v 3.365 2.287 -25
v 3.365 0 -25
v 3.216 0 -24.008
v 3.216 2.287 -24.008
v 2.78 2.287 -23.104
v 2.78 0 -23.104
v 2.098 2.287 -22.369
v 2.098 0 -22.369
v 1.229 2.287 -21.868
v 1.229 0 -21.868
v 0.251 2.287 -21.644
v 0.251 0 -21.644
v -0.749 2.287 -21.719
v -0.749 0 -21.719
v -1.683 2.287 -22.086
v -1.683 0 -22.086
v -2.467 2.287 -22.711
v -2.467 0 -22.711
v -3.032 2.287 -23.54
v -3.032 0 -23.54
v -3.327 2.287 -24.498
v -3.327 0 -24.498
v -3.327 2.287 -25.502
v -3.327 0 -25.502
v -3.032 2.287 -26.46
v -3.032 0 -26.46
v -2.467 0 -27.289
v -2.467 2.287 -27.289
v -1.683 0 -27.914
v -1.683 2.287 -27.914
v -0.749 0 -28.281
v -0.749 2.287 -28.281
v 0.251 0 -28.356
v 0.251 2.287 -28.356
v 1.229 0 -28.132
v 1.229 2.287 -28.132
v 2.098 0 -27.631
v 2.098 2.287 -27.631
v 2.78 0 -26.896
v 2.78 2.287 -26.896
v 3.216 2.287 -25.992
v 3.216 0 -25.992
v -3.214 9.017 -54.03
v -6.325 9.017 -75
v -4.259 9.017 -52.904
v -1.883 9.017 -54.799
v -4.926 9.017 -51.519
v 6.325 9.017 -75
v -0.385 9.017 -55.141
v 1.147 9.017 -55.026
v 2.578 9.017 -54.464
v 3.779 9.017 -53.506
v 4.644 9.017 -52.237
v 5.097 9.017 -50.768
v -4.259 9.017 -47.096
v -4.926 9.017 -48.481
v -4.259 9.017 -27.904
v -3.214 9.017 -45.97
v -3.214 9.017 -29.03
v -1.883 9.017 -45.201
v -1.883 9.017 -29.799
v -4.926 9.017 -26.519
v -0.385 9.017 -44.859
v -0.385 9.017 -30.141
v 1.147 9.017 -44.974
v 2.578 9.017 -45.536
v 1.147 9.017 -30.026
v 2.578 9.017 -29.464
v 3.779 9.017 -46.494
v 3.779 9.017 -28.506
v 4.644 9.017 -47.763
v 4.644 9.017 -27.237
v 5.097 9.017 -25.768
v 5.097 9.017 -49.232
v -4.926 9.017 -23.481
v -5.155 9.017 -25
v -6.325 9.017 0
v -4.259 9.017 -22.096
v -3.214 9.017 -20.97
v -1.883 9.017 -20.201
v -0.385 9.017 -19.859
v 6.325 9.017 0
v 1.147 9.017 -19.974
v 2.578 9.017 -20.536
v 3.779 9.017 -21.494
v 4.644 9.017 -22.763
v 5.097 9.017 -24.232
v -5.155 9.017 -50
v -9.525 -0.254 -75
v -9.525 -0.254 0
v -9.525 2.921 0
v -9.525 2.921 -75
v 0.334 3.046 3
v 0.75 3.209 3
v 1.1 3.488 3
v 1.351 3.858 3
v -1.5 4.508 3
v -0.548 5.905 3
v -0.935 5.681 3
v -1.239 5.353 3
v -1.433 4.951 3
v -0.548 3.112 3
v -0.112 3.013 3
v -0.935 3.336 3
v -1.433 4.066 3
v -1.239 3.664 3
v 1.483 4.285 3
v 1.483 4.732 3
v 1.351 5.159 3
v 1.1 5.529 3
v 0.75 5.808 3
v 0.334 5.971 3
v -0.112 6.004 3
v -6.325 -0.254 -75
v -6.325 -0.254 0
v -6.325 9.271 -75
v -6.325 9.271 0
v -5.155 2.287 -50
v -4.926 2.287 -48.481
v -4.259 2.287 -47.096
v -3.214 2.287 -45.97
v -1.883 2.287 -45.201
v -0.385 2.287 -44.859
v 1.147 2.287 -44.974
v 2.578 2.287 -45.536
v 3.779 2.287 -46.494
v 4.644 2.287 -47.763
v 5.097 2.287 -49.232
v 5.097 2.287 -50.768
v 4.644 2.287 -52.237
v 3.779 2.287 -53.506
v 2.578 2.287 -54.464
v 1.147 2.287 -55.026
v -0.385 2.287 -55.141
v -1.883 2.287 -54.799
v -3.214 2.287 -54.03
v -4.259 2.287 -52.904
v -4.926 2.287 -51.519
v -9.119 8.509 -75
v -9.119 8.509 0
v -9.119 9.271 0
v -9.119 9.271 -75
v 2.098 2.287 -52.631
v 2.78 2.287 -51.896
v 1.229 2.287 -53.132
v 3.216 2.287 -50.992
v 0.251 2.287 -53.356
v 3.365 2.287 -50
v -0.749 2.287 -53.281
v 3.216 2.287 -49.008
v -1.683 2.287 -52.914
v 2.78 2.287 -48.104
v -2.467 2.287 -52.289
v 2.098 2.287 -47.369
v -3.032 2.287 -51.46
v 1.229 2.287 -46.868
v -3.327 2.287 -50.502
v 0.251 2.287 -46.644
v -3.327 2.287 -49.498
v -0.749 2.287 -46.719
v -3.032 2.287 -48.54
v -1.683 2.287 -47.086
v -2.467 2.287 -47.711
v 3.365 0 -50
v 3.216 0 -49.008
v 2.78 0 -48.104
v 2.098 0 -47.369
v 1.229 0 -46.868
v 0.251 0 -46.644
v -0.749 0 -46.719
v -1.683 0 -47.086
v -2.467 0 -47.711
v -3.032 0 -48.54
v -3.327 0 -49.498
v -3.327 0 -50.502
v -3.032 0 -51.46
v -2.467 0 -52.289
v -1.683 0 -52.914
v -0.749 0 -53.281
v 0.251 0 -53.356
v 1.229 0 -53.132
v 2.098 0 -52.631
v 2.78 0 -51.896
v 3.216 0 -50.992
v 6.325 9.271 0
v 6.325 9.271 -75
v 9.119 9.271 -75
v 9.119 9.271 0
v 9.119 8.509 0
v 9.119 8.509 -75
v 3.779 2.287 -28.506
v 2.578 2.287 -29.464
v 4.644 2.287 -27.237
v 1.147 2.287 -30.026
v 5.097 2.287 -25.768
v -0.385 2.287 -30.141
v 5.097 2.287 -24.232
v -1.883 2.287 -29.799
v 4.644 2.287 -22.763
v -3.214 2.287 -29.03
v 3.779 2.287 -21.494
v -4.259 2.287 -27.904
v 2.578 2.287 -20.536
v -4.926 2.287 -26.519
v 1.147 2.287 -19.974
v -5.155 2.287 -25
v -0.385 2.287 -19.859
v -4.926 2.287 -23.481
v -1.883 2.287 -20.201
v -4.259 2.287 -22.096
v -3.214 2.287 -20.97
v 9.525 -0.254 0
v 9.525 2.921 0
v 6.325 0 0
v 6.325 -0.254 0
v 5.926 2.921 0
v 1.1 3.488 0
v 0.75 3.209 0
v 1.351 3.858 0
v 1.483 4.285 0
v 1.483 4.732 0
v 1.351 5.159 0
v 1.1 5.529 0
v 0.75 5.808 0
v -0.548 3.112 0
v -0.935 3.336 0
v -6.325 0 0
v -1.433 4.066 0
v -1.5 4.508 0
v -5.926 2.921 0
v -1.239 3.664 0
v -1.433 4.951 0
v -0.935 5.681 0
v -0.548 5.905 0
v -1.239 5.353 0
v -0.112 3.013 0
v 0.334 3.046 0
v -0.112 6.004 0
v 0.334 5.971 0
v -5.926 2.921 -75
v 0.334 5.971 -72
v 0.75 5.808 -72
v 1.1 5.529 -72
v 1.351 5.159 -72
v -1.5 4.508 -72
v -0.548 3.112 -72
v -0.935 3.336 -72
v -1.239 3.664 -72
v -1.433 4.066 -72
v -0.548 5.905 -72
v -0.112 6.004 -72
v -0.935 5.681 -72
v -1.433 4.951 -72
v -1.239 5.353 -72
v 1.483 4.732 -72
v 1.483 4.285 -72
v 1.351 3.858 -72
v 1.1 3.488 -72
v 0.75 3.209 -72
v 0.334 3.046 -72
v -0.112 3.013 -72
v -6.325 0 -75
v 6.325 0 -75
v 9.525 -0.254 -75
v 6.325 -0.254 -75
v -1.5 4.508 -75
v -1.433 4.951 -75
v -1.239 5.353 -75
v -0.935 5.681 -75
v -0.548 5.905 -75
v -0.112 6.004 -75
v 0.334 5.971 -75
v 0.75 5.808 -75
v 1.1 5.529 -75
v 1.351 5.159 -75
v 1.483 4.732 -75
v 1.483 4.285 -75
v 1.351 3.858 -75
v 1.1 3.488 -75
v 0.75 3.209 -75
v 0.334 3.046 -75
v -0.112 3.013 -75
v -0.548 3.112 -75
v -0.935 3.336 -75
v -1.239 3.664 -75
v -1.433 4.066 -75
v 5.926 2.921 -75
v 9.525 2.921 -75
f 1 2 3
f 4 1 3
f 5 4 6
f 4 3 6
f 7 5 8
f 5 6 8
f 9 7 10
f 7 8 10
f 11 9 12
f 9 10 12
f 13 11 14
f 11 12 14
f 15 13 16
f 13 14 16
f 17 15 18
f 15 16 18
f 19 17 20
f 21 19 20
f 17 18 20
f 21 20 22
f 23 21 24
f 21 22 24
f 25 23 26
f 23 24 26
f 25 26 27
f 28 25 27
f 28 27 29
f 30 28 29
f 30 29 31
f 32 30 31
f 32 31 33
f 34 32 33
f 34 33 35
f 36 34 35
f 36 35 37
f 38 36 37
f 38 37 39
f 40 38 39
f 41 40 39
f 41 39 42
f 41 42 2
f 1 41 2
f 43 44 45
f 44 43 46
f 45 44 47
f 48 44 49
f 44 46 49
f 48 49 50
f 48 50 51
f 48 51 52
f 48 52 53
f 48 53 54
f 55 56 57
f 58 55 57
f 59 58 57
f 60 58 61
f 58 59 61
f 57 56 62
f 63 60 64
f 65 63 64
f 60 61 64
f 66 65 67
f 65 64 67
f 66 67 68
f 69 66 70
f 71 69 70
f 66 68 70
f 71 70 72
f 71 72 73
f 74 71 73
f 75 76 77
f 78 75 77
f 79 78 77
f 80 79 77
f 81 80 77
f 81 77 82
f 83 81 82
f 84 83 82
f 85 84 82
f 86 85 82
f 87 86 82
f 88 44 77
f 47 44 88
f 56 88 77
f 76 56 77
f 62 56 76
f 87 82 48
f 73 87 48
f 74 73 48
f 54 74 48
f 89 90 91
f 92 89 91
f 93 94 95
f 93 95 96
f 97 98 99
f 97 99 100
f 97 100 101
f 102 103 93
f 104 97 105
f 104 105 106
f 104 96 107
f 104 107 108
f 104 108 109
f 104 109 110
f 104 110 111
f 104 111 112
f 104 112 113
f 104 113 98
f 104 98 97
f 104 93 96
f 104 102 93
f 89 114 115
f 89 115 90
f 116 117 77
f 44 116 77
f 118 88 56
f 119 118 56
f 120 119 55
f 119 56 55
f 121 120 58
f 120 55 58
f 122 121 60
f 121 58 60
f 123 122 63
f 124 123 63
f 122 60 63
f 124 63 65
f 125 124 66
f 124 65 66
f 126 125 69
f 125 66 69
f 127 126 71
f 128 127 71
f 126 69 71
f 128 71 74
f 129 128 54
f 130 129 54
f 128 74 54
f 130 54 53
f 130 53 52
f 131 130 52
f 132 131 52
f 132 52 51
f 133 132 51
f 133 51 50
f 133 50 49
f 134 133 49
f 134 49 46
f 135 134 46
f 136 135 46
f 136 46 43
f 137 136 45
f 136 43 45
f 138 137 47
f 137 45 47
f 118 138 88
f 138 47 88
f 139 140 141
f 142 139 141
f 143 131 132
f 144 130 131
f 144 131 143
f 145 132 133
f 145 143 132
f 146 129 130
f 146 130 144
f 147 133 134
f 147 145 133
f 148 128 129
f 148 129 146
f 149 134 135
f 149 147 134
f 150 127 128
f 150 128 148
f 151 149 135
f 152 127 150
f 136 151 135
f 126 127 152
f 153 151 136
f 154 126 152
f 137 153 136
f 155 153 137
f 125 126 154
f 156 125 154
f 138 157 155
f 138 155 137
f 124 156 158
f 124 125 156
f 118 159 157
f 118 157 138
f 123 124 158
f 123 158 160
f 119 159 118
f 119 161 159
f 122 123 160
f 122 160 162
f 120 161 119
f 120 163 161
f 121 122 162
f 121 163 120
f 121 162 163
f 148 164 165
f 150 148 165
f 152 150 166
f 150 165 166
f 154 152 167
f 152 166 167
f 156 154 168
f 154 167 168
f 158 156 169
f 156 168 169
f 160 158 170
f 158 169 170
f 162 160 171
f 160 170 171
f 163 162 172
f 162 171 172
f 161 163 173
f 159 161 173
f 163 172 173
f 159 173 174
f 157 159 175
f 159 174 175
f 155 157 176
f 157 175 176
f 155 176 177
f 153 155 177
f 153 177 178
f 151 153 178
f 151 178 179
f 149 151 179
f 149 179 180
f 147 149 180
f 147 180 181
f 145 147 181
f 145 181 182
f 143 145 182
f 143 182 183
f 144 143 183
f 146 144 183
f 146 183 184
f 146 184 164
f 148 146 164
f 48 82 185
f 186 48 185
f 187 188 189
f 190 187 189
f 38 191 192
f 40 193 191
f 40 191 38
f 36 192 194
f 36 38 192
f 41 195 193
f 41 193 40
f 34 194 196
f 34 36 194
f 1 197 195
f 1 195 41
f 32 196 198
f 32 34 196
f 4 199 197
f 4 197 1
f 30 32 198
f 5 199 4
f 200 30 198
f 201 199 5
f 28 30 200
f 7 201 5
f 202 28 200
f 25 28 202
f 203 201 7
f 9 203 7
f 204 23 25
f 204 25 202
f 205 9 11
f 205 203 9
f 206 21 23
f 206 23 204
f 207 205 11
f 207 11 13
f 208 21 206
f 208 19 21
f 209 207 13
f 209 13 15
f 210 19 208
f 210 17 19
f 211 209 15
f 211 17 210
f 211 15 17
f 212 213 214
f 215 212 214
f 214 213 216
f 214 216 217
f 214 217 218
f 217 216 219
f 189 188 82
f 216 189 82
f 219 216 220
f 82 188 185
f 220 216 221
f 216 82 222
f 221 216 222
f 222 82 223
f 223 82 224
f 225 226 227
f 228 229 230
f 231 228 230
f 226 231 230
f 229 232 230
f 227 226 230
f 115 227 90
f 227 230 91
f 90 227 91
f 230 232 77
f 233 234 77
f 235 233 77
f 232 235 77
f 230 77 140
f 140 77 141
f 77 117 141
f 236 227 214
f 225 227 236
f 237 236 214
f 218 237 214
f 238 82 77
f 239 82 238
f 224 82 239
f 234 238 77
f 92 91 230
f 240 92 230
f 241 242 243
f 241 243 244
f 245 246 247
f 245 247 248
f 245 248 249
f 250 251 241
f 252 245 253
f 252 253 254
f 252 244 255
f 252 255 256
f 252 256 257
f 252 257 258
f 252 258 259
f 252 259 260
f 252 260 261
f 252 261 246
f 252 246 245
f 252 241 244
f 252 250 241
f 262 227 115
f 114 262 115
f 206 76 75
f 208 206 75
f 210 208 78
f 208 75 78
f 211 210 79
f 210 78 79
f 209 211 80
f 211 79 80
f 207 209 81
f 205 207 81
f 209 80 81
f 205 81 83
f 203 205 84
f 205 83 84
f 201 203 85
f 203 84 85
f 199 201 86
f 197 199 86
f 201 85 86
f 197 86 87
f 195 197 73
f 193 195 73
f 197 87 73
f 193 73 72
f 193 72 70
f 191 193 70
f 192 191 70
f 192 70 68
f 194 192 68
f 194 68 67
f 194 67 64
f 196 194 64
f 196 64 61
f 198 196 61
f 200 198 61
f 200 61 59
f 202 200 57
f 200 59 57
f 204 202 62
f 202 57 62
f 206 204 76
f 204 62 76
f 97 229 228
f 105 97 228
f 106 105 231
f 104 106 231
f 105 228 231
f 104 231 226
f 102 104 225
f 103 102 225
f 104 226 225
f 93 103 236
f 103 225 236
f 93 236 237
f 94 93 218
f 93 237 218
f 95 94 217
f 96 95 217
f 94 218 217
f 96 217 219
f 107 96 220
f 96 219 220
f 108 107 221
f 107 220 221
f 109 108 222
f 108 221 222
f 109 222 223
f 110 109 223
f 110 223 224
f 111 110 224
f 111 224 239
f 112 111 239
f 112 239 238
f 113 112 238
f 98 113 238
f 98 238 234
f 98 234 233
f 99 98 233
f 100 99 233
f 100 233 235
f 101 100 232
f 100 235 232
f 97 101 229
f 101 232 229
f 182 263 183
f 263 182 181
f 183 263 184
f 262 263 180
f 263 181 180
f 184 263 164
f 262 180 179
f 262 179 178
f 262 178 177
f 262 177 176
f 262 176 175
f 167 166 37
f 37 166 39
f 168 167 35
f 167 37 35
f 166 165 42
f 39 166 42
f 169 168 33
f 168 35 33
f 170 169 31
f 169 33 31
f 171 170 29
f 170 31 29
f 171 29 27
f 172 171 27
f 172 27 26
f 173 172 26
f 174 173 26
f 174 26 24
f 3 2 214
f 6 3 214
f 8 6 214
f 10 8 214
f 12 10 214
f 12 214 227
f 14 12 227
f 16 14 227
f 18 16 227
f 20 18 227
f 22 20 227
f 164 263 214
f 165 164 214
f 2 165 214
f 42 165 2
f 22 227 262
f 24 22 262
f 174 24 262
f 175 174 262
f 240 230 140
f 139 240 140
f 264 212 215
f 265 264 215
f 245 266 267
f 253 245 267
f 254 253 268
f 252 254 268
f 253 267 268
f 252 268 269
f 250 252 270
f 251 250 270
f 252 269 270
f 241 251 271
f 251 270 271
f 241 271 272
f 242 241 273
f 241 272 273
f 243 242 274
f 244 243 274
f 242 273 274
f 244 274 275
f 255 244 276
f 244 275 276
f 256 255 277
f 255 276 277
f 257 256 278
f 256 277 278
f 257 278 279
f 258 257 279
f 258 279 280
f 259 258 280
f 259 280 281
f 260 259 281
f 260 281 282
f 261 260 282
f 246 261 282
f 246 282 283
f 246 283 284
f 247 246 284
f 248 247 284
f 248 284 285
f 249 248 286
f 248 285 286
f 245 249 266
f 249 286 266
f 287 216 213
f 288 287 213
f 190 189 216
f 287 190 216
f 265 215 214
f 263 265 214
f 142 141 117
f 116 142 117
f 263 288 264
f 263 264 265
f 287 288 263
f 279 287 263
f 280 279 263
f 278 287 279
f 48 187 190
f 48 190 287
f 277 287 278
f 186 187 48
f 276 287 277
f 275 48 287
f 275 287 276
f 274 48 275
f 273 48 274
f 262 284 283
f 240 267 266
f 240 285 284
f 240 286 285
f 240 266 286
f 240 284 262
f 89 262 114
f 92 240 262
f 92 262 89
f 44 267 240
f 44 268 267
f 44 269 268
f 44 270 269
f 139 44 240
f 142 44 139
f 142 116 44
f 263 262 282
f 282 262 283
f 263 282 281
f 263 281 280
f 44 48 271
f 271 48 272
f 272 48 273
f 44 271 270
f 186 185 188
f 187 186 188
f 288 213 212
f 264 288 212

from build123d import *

# Parameters (mm, degrees)
BOSS_EXTRUDE1_DEPTH = 75
SKETCH3_R           = 5.155
CUT_EXTRUDE2_DEPTH  = 6.73
SKETCH4_R           = 3.365
CUT_EXTRUDE3_DEPTH  = 2.54
SKETCH5_R           = 1.5
CUT_EXTRUDE4_DEPTH  = 3
SKETCH6_R           = 1.5
BOSS_EXTRUDE2_DEPTH = 3


with BuildPart() as part:
    # Sketch1 → Boss-Extrude1 (new body)
    with BuildSketch(Plane.XY):
        Polygon((6.3246, 9.017), (6.3246, 9.271), (9.1186, 9.271), (9.1186, 8.509), (5.926144338, 2.921), (9.525, 2.921), (9.525, -0.254), (6.3246, -0.254), (6.3246, 0), (-6.3246, 0), (-6.3246, -0.254), (-9.525, -0.254), (-9.525, 2.921), (-5.926144338, 2.921), (-9.1186, 8.509), (-9.1186, 9.271), (-6.3246, 9.271), (-6.3246, 9.017), align=None)
    extrude(amount=-BOSS_EXTRUDE1_DEPTH)

    # Sketch3 → Cut-Extrude2 (cut)
    with BuildSketch(Plane(origin=(0, 9.017, 0), x_dir=(1, 0, 0), z_dir=(0, 1, 0))):
        with Locations(Location((0, 25, 0), (0, 0, 180))):
            Circle(SKETCH3_R)
        with Locations(Location((0, 50, 0), (0, 0, 180))):
            Circle(SKETCH3_R)
    extrude(amount=-CUT_EXTRUDE2_DEPTH, mode=Mode.SUBTRACT)

    # Sketch4 → Cut-Extrude3 (cut)
    with BuildSketch(Plane.XZ):
        with Locations((0, -25)):
            Circle(SKETCH4_R)
        with Locations((0, -50)):
            Circle(SKETCH4_R)
    extrude(amount=-CUT_EXTRUDE3_DEPTH, mode=Mode.SUBTRACT)

    # Sketch5 → Cut-Extrude4 (cut)
    with BuildSketch(Plane(origin=(0, 0, -75), x_dir=(-1, 0, 0), z_dir=(0, 0, -1))):
        with Locations((0, 4.5085)):
            Circle(SKETCH5_R)
    extrude(amount=-CUT_EXTRUDE4_DEPTH, mode=Mode.SUBTRACT)

    # Sketch6 → Boss-Extrude2 (add)
    with BuildSketch(Plane.XY):
        with Locations(Location((0, 4.5085, 0), (0, 0, 180))):
            Circle(SKETCH6_R)
    extrude(amount=BOSS_EXTRUDE2_DEPTH)


solid = part.part
